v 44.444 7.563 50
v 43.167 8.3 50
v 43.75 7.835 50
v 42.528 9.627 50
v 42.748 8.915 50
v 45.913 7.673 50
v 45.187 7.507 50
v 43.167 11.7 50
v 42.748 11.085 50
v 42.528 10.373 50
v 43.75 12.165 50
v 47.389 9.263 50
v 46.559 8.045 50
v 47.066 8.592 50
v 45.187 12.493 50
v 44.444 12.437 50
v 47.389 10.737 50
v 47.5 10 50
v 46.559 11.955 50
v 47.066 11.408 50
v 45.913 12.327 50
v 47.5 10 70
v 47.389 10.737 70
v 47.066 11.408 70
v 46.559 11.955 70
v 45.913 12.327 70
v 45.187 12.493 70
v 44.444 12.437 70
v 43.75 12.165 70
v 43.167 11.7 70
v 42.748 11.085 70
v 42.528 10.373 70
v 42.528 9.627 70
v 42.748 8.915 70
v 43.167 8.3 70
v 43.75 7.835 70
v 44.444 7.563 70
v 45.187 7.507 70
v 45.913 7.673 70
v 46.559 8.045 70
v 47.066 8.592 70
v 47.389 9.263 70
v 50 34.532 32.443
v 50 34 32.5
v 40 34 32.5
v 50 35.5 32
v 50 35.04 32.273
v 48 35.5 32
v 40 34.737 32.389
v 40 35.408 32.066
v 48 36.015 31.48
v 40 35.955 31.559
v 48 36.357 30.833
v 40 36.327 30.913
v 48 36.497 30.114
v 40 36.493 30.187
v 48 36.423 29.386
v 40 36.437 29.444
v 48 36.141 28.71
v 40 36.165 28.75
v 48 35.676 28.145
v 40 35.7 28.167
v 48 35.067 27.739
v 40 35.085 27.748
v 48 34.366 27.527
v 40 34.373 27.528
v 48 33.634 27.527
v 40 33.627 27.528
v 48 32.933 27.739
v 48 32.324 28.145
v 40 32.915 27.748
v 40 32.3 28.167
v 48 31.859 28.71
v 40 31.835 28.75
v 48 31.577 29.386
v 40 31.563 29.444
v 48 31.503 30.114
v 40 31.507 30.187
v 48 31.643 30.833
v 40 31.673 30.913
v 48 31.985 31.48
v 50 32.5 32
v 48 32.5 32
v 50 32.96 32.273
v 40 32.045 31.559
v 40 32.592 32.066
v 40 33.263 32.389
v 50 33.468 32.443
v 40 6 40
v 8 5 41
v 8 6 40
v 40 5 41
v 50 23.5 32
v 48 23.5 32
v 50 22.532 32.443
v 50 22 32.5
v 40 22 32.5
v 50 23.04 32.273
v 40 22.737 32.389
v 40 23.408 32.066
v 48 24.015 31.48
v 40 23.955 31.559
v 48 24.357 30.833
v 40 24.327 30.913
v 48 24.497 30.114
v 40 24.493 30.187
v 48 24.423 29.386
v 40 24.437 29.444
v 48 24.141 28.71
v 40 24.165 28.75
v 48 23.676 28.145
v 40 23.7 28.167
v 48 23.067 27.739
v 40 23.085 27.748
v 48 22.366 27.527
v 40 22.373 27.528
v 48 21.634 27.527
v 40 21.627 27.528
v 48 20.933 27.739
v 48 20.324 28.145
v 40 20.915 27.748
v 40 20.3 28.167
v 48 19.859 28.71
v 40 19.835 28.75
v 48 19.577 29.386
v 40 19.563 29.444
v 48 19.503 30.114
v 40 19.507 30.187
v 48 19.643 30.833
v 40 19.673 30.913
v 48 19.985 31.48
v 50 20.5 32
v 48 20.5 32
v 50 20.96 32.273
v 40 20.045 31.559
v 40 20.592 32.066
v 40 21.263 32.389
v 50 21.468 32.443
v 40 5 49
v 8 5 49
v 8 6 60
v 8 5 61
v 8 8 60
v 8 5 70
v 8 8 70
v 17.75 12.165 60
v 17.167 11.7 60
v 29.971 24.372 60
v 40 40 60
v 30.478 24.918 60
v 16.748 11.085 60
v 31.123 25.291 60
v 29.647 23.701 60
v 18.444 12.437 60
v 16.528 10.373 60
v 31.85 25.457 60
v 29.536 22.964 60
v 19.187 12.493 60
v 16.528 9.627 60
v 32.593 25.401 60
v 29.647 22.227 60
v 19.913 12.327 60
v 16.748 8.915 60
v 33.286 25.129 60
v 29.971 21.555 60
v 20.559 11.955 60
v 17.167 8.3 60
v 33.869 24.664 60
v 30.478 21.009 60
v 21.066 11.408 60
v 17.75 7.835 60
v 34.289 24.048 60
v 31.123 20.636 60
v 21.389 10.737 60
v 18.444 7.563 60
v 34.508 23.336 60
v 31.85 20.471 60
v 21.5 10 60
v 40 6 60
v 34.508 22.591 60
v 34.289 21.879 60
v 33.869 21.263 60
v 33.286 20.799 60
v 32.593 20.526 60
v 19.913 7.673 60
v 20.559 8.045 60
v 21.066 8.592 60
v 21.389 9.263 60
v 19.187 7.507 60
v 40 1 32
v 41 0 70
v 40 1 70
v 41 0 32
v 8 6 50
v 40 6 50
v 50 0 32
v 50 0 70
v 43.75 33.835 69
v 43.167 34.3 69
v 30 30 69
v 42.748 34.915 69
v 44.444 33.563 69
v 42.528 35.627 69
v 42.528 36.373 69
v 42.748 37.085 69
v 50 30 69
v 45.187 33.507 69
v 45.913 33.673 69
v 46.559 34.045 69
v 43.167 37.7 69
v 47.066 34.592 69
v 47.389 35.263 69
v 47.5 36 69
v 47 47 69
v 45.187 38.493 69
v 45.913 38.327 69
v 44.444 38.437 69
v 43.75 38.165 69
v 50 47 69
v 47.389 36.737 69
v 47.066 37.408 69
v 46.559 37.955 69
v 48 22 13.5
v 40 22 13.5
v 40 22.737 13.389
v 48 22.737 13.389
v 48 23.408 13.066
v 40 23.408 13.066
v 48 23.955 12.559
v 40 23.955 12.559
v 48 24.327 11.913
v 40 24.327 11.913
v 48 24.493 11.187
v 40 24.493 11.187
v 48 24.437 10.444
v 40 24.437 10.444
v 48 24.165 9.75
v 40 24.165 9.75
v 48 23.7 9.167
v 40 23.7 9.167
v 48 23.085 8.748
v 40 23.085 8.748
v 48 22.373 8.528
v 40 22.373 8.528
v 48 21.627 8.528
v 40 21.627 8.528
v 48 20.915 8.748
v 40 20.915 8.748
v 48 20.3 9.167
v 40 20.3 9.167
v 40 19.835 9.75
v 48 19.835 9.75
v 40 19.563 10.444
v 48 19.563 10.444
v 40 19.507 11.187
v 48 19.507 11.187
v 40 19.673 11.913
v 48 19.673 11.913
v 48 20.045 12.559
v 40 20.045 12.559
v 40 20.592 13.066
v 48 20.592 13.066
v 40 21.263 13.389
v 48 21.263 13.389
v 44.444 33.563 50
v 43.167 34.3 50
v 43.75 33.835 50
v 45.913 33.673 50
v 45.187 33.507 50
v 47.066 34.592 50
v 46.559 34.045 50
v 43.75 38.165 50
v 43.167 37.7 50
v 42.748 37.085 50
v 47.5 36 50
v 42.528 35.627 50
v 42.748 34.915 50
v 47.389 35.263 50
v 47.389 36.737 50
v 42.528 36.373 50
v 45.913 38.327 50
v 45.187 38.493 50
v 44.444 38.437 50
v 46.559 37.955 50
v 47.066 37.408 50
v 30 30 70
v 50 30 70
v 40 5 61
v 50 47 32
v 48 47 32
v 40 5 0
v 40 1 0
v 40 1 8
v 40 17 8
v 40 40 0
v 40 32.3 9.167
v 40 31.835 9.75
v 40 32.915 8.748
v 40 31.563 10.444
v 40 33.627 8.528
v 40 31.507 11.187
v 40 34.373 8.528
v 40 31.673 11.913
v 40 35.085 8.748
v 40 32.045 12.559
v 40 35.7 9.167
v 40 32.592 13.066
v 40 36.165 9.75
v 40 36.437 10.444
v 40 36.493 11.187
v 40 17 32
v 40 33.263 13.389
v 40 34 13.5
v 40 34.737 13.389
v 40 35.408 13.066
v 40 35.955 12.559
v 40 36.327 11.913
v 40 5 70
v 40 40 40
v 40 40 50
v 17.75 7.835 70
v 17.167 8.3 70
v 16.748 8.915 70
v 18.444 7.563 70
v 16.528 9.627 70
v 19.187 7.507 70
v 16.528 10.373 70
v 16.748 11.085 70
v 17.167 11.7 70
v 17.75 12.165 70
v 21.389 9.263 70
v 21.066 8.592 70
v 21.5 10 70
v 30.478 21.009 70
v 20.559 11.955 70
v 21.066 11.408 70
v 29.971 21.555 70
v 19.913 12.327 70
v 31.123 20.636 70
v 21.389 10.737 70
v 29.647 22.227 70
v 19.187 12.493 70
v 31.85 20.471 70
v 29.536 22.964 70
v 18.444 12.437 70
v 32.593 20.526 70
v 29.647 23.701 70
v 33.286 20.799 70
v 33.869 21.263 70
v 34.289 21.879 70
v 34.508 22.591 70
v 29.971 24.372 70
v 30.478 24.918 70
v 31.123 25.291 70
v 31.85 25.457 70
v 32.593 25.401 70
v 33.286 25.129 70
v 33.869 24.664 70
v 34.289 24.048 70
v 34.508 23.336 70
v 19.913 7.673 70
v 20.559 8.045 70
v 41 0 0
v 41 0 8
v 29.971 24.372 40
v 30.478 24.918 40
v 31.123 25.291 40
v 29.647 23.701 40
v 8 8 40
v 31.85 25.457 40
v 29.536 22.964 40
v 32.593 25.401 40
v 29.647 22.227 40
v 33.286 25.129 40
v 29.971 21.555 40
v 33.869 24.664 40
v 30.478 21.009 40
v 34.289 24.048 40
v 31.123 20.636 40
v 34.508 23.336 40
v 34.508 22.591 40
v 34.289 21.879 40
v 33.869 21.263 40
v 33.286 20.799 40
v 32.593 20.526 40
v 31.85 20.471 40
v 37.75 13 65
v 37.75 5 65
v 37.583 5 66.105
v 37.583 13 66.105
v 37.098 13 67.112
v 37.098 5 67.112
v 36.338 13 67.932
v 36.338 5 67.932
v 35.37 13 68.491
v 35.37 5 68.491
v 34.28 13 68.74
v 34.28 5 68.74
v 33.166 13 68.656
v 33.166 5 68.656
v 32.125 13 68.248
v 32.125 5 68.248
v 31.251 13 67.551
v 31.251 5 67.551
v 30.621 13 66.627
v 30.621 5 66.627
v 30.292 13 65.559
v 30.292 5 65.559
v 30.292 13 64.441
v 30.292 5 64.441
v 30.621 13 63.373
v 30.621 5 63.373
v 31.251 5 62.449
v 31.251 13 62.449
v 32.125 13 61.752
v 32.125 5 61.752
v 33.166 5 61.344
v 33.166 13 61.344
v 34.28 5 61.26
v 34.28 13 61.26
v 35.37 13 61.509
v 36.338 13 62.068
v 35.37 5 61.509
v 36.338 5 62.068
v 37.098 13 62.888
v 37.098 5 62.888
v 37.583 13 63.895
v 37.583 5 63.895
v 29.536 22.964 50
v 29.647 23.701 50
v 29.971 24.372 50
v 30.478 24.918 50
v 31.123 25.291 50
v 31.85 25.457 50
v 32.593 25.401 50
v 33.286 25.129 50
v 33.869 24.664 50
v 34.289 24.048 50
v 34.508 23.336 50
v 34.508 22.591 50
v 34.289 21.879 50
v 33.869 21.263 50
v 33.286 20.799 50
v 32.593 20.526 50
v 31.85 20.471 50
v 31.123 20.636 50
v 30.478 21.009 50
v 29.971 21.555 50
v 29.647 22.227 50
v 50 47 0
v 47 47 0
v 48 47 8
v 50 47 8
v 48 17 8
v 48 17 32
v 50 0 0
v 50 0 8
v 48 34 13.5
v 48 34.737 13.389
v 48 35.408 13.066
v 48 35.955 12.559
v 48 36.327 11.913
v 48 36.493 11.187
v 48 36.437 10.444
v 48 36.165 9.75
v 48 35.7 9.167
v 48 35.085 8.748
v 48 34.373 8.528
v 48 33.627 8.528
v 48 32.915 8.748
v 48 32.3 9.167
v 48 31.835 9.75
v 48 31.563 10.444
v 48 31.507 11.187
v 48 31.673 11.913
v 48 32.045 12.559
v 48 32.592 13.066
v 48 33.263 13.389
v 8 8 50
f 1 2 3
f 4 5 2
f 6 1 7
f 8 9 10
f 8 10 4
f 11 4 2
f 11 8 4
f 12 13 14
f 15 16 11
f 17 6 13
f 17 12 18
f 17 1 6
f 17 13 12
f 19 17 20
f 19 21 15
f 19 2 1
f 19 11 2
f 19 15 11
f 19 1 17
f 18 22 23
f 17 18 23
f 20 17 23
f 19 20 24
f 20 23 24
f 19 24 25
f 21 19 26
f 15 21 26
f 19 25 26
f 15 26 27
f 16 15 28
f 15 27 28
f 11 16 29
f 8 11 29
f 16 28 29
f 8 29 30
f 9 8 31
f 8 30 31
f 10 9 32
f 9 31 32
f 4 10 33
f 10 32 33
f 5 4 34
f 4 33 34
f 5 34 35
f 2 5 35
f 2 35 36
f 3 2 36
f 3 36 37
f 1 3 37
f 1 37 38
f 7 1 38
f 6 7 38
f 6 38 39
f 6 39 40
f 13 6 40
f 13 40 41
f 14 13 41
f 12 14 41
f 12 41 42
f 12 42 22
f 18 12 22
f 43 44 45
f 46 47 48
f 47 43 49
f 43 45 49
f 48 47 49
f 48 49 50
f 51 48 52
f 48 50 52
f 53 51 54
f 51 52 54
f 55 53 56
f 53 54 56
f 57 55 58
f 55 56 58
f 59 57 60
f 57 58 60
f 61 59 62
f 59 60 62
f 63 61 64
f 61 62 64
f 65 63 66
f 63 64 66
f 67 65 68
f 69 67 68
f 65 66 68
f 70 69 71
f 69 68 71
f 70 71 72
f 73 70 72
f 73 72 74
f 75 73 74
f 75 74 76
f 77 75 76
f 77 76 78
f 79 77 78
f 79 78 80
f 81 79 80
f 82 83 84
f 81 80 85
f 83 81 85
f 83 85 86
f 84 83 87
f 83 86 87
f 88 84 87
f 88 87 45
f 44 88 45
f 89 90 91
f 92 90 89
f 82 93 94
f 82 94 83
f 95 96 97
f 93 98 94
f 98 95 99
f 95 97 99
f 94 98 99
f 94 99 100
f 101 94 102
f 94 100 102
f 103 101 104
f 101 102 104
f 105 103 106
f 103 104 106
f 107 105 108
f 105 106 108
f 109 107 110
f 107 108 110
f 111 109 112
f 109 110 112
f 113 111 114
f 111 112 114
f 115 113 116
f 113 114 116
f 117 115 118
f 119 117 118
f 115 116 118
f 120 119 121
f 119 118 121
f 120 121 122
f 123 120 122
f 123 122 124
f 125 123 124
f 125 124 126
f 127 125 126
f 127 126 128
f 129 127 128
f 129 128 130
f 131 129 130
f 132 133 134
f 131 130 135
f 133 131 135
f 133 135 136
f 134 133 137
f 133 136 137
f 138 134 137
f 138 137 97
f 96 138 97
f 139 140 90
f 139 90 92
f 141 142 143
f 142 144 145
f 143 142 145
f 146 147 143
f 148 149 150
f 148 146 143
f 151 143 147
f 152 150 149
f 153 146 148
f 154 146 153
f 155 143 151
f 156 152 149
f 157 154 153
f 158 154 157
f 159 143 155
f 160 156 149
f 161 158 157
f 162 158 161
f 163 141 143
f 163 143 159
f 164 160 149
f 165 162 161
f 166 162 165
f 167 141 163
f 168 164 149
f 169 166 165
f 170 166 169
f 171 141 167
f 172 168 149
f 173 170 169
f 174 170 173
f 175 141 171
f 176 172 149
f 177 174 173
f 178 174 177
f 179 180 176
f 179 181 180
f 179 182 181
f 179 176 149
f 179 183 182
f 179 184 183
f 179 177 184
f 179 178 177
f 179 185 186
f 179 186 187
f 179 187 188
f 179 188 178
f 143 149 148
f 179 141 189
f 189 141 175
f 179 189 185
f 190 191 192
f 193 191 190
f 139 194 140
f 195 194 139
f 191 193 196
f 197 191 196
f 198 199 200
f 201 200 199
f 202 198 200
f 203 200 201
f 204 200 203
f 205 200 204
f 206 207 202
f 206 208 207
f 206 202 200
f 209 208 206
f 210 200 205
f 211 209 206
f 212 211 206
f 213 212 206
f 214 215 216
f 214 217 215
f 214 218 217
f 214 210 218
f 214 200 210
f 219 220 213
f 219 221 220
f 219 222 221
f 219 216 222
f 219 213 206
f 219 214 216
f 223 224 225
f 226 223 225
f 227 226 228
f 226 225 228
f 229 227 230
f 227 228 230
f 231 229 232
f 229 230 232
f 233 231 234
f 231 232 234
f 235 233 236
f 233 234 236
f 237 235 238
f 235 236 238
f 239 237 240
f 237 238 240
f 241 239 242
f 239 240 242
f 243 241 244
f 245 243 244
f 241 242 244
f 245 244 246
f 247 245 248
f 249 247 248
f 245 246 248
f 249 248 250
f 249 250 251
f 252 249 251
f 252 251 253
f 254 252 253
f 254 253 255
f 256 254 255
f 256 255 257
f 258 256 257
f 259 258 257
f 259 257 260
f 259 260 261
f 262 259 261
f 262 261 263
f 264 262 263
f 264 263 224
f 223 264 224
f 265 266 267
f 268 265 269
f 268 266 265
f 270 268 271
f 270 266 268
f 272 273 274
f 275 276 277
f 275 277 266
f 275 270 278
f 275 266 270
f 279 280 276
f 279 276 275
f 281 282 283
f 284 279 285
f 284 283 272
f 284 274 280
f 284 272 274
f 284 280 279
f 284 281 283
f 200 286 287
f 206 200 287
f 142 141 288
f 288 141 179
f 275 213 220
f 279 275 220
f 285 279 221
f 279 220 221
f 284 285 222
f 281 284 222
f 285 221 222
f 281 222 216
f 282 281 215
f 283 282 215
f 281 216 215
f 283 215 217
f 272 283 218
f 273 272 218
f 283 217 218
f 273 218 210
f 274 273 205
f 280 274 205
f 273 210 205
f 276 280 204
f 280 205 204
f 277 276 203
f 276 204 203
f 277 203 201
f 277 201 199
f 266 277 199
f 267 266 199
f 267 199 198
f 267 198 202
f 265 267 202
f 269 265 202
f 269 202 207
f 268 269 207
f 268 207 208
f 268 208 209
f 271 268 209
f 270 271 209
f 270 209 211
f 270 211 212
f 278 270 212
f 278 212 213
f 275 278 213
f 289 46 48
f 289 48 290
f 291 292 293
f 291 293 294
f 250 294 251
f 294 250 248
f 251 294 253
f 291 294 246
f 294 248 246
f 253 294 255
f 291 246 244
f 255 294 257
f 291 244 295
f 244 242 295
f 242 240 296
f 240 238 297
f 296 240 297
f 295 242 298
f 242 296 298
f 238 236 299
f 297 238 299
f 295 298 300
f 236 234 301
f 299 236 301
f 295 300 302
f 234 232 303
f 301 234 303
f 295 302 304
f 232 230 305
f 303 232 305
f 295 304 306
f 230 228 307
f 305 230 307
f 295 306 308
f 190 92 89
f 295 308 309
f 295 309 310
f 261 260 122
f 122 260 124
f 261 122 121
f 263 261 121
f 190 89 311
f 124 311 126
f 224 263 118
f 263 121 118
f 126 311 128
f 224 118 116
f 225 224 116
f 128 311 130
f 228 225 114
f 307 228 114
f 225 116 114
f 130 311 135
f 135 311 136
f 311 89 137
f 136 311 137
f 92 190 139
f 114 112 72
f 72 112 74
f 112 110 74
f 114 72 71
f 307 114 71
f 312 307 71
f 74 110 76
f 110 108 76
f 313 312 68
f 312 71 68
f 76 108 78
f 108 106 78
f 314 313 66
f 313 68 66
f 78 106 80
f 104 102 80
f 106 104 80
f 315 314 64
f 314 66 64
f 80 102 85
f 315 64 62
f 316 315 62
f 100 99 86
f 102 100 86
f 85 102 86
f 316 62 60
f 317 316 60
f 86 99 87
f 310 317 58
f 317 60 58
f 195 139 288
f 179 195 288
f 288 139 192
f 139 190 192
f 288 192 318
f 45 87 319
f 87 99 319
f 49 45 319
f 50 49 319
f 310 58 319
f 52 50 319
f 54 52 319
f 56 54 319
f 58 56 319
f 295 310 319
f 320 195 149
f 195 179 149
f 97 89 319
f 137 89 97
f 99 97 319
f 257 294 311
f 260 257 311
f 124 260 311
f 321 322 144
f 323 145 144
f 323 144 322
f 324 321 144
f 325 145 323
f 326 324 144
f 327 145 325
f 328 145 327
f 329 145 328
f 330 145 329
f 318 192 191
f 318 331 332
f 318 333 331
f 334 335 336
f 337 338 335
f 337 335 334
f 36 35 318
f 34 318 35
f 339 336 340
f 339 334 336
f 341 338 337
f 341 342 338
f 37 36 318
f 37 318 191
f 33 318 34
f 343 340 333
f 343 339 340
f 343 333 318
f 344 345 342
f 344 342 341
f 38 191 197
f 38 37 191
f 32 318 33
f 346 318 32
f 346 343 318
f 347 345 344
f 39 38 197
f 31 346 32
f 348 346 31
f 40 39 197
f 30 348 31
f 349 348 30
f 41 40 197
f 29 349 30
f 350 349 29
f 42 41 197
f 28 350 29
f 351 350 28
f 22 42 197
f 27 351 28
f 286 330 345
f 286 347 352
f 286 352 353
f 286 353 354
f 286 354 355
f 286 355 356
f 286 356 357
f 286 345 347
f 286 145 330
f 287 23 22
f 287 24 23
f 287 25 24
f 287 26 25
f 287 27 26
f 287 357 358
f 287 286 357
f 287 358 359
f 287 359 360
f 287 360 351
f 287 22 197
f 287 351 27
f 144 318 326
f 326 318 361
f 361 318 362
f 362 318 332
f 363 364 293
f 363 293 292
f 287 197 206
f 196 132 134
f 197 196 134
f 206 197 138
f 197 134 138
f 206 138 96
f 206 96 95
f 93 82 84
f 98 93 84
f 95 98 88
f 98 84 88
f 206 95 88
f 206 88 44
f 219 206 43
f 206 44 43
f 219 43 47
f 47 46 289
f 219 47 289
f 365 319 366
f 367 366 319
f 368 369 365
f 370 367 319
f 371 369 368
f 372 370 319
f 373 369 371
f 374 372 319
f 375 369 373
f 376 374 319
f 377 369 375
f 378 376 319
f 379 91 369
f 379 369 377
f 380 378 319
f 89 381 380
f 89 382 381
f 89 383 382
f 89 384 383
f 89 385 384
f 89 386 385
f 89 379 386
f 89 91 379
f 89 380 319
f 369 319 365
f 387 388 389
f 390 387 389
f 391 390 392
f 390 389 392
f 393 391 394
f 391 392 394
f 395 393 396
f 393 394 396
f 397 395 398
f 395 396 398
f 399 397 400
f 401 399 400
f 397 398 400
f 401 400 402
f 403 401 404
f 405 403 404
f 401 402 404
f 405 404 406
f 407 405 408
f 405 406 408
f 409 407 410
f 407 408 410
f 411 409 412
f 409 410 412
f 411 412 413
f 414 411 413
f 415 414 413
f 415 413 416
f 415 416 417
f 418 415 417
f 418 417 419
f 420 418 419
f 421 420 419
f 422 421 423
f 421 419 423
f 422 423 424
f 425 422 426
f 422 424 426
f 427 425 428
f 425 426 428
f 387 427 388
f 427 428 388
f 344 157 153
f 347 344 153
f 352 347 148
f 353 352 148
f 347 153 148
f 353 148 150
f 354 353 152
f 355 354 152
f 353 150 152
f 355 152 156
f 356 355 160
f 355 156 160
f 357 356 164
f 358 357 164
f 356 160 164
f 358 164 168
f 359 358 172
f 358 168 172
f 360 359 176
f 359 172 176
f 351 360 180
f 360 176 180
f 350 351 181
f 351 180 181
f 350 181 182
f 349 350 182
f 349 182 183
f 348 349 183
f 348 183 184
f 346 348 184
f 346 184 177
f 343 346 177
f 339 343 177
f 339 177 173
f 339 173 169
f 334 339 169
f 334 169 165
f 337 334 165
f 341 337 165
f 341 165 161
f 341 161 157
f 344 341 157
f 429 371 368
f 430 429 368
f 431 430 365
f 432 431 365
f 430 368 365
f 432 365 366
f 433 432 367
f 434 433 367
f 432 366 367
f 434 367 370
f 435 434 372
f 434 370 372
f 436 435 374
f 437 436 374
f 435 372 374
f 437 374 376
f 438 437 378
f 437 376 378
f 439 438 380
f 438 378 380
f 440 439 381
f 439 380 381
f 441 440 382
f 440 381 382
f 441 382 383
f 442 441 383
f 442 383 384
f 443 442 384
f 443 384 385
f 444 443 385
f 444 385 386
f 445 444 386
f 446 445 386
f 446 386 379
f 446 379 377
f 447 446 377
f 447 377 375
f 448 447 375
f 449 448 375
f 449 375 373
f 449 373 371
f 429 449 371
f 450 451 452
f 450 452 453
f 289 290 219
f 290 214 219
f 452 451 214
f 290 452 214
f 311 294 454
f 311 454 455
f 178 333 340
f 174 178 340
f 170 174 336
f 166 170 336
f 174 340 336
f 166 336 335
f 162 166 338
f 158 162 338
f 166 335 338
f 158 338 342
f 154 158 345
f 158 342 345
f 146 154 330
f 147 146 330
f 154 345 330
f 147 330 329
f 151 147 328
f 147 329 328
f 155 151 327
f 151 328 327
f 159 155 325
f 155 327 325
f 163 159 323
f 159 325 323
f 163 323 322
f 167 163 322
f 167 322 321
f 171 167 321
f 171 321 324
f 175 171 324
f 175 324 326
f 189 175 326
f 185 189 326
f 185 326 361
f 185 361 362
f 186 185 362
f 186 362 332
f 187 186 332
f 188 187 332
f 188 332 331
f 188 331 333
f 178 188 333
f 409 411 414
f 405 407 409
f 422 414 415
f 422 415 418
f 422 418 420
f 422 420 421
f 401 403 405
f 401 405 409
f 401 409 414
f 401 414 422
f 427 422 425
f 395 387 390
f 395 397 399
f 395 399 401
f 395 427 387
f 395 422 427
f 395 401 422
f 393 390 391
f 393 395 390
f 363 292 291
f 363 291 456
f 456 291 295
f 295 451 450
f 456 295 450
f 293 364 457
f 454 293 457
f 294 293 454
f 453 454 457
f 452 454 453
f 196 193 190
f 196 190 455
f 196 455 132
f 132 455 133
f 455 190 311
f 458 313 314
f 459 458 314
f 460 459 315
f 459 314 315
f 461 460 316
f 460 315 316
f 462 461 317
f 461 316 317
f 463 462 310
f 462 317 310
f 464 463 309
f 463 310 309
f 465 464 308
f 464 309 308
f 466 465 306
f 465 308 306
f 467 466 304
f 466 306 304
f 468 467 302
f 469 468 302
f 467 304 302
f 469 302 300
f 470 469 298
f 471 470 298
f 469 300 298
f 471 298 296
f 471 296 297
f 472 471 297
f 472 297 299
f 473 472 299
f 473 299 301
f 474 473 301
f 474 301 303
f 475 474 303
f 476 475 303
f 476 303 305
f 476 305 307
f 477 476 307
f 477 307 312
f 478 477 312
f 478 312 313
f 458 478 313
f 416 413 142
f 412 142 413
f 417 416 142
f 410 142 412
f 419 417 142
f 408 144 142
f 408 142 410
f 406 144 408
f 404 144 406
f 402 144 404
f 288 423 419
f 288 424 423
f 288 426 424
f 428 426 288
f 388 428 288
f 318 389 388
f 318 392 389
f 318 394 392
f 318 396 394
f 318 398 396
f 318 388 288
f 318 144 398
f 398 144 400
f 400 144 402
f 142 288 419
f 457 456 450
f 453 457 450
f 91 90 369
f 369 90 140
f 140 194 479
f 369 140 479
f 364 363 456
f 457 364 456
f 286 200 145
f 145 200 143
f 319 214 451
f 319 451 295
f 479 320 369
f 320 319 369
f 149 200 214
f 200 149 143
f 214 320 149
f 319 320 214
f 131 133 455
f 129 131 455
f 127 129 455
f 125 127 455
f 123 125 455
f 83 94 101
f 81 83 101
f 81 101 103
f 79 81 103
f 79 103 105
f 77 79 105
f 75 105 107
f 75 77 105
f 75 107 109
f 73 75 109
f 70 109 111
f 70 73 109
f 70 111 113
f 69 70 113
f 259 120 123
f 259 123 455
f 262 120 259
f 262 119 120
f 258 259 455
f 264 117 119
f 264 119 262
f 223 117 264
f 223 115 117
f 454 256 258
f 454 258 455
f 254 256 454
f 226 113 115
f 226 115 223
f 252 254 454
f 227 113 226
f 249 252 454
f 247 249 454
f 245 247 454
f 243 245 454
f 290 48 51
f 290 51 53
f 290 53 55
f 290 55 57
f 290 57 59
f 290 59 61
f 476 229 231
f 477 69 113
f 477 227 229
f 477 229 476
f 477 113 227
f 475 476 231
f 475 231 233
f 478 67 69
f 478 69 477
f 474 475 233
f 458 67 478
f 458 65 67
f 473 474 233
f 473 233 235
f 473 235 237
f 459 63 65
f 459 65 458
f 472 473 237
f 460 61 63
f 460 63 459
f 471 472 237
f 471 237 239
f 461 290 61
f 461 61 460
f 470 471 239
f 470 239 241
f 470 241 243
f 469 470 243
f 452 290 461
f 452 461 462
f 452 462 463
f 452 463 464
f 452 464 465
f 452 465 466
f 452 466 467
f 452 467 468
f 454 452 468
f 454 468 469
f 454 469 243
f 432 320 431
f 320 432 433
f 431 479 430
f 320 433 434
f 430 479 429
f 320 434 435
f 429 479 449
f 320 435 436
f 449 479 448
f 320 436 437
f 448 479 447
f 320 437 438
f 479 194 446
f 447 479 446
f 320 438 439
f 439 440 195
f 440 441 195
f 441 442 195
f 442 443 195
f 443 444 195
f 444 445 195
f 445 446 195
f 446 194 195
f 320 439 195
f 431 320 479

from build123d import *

# Parameters (mm, degrees)
EXTRUDE_1_DEPTH      = 70
SKETCH_2_W           = 45.532219889
SKETCH_2_H           = 5
CUT_EXTRUDE_1_DEPTH  = 100.498743711
SKETCH_3_W           = 35
SKETCH_3_H           = 10
SKETCH_3_H_2         = 46.866381138
CUT_EXTRUDE_2_DEPTH  = 98.082439195
CUT_EXTRUDE_3_DEPTH  = 100.498743711
CUT_EXTRUDE_7_REACH  = 101.499
SKETCH_9_R           = 2.5
CHAMFER_1_SIZE       = 1
SKETCH_11_R          = 3.75
CUT_EXTRUDE_10_DEPTH = 8
CUT_EXTRUDE_11_DEPTH = 100.498743711
CUT_EXTRUDE_12_DEPTH = 1
SKETCH_15_W          = 24
SKETCH_15_H          = 17
CUT_EXTRUDE_14_DEPTH = 10
SKETCH_16_R          = 2.5
CUT_EXTRUDE_15_DEPTH = 91.183146984
SKETCH_17_W          = 24
SKETCH_17_H          = 30
CUT_EXTRUDE_16_DEPTH = 2
SKETCH_7_R           = 2.5
CUT_EXTRUDE_17_DEPTH = 80.429213769
CHAMFER_2_SIZE       = 1
CHAMFER_3_SIZE       = 1


with BuildPart() as part:
    # 草图1 → 拉伸1 (new body)
    with BuildSketch(Plane.XY):
        Polygon((0, 0), (50, 0), (50, 50), align=None)
    extrude(amount=EXTRUDE_1_DEPTH)

    # 草图2 → 切除-拉伸1 (cut, through all)
    with BuildSketch(Plane.XY.offset(70)):
        with Locations((17.233890055, 2.5)):
            Rectangle(SKETCH_2_W, SKETCH_2_H)
    extrude(amount=-CUT_EXTRUDE_1_DEPTH, mode=Mode.SUBTRACT)

    # 草图3 → 切除-拉伸2 (cut, through all)
    with BuildSketch(Plane.XZ.offset(-5)):
        with Locations((22.5, 55)):
            Rectangle(SKETCH_3_W, SKETCH_3_H)
        with Locations((22.5, 16.566809431)):
            Rectangle(SKETCH_3_W, SKETCH_3_H_2)
    extrude(amount=-CUT_EXTRUDE_2_DEPTH, mode=Mode.SUBTRACT)

    # 草图4 → 切除-拉伸3 (cut, through all)
    with BuildSketch(Plane.XY.offset(70)):
        Polygon((5, 5), (8, 5), (8, 8), align=None)
    extrude(amount=-CUT_EXTRUDE_3_DEPTH, mode=Mode.SUBTRACT)

    # 切除-拉伸7: up to this face of the body (flat: up to its plane)
    cut_extrude_7_end = Plane(part.part.faces().sort_by_distance((28.49122807, 16.745614035, 50))[0])
    # 草图9 → 切除-拉伸7 (cut, up to the picked face)
    with BuildSketch(Plane.XY.offset(70), mode=Mode.PRIVATE) as cut_extrude_7_sk1:
        with Locations((45, 36)):
            Circle(SKETCH_9_R)
    cut_extrude_7_tool1 = split(extrude(cut_extrude_7_sk1.sketch, amount=-CUT_EXTRUDE_7_REACH, mode=Mode.PRIVATE), bisect_by=cut_extrude_7_end, keep=Keep.BOTH, mode=Mode.PRIVATE)
    # 草图9 → 切除-拉伸7 (cut, up to the picked face)
    with BuildSketch(Plane.XY.offset(70), mode=Mode.PRIVATE) as cut_extrude_7_sk2:
        with Locations((45, 10)):
            Circle(SKETCH_9_R)
    cut_extrude_7_tool2 = split(extrude(cut_extrude_7_sk2.sketch, amount=-CUT_EXTRUDE_7_REACH, mode=Mode.PRIVATE), bisect_by=cut_extrude_7_end, keep=Keep.BOTH, mode=Mode.PRIVATE)
    # 草图9 → 切除-拉伸7 (cut, up to the picked face)
    with BuildSketch(Plane.XY.offset(70), mode=Mode.PRIVATE) as cut_extrude_7_sk3:
        with Locations((19, 10)):
            Circle(SKETCH_9_R)
    cut_extrude_7_tool3 = split(extrude(cut_extrude_7_sk3.sketch, amount=-CUT_EXTRUDE_7_REACH, mode=Mode.PRIVATE), bisect_by=cut_extrude_7_end, keep=Keep.BOTH, mode=Mode.PRIVATE)
    add(cut_extrude_7_tool1.solids().sort_by(Axis((45, 36, 70), (0, 0, -1)))[0], mode=Mode.SUBTRACT)
    add(cut_extrude_7_tool2.solids().sort_by(Axis((45, 10, 70), (0, 0, -1)))[0], mode=Mode.SUBTRACT)
    add(cut_extrude_7_tool3.solids().sort_by(Axis((19, 10, 70), (0, 0, -1)))[0], mode=Mode.SUBTRACT)

    # 倒角1
    chamfer_1_edges = [part.edges().sort_by_distance(p)[0] for p in [
        (24, 5, 60),
        (24, 5, 40),
        (24, 5, 50),
    ]]
    chamfer(chamfer_1_edges, length=CHAMFER_1_SIZE)

    # 草图11 → 切除-拉伸10 (cut)
    with BuildSketch(Plane.XZ.offset(-5)):
        with Locations((34, 65)):
            Circle(SKETCH_11_R)
    extrude(amount=-CUT_EXTRUDE_10_DEPTH, mode=Mode.SUBTRACT)

    # 草图13 → 切除-拉伸11 (cut, through all)
    with BuildSketch(Plane.XY.offset(70)):
        Polygon((50, 50), (47, 47), (50, 47), align=None)
    extrude(amount=-CUT_EXTRUDE_11_DEPTH, mode=Mode.SUBTRACT)

    # 草图14 → 切除-拉伸12 (cut)
    with BuildSketch(Plane.XY.offset(70)):
        Polygon((50, 47), (47, 47), (30, 30), (50, 30), align=None)
    extrude(amount=-CUT_EXTRUDE_12_DEPTH, mode=Mode.SUBTRACT)

    # 草图15 → 切除-拉伸14 (cut)
    with BuildSketch(Plane.ZY.offset(-40)):
        with Locations((20, 8.5)):
            Rectangle(SKETCH_15_W, SKETCH_15_H)
    extrude(amount=-CUT_EXTRUDE_14_DEPTH, mode=Mode.SUBTRACT)

    # 草图16 → 切除-拉伸15 (cut, through all)
    with BuildSketch(Plane.ZY.offset(-40)):
        with Locations((30, 34)):
            Circle(SKETCH_16_R)
        with Locations((30, 22)):
            Circle(SKETCH_16_R)
        with Locations((11, 34)):
            Circle(SKETCH_16_R)
        with Locations((11, 22)):
            Circle(SKETCH_16_R)
    extrude(amount=-CUT_EXTRUDE_15_DEPTH, mode=Mode.SUBTRACT)

    # 草图17 → 切除-拉伸16 (cut)
    with BuildSketch(Plane(origin=(50, 0, 0), x_dir=(0, 0, -1), z_dir=(1, 0, 0))):
        with Locations((-20, 32)):
            Rectangle(SKETCH_17_W, SKETCH_17_H)
    extrude(amount=-CUT_EXTRUDE_16_DEPTH, mode=Mode.SUBTRACT)

    # 草图7 → 切除-拉伸17 (cut, through all)
    with BuildSketch(Plane(origin=(0, 0, 40), x_dir=(-1, 0, 0), z_dir=(0, 0, -1))):
        with Locations((-32.036330274, 22.963669726)):
            Circle(SKETCH_7_R)
    extrude(amount=-CUT_EXTRUDE_17_DEPTH, mode=Mode.SUBTRACT)

    # 倒角2
    chamfer_2_edges = [part.edges().sort_by_distance(p)[0] for p in [
        (40, 0, 51),
    ]]
    chamfer(chamfer_2_edges, length=CHAMFER_2_SIZE)

    # 倒角3
    chamfer_3_edges = [part.edges().sort_by_distance(p)[0] for p in [
        (40, 0, 4),
    ]]
    chamfer(chamfer_3_edges, length=CHAMFER_3_SIZE)


solid = part.part
